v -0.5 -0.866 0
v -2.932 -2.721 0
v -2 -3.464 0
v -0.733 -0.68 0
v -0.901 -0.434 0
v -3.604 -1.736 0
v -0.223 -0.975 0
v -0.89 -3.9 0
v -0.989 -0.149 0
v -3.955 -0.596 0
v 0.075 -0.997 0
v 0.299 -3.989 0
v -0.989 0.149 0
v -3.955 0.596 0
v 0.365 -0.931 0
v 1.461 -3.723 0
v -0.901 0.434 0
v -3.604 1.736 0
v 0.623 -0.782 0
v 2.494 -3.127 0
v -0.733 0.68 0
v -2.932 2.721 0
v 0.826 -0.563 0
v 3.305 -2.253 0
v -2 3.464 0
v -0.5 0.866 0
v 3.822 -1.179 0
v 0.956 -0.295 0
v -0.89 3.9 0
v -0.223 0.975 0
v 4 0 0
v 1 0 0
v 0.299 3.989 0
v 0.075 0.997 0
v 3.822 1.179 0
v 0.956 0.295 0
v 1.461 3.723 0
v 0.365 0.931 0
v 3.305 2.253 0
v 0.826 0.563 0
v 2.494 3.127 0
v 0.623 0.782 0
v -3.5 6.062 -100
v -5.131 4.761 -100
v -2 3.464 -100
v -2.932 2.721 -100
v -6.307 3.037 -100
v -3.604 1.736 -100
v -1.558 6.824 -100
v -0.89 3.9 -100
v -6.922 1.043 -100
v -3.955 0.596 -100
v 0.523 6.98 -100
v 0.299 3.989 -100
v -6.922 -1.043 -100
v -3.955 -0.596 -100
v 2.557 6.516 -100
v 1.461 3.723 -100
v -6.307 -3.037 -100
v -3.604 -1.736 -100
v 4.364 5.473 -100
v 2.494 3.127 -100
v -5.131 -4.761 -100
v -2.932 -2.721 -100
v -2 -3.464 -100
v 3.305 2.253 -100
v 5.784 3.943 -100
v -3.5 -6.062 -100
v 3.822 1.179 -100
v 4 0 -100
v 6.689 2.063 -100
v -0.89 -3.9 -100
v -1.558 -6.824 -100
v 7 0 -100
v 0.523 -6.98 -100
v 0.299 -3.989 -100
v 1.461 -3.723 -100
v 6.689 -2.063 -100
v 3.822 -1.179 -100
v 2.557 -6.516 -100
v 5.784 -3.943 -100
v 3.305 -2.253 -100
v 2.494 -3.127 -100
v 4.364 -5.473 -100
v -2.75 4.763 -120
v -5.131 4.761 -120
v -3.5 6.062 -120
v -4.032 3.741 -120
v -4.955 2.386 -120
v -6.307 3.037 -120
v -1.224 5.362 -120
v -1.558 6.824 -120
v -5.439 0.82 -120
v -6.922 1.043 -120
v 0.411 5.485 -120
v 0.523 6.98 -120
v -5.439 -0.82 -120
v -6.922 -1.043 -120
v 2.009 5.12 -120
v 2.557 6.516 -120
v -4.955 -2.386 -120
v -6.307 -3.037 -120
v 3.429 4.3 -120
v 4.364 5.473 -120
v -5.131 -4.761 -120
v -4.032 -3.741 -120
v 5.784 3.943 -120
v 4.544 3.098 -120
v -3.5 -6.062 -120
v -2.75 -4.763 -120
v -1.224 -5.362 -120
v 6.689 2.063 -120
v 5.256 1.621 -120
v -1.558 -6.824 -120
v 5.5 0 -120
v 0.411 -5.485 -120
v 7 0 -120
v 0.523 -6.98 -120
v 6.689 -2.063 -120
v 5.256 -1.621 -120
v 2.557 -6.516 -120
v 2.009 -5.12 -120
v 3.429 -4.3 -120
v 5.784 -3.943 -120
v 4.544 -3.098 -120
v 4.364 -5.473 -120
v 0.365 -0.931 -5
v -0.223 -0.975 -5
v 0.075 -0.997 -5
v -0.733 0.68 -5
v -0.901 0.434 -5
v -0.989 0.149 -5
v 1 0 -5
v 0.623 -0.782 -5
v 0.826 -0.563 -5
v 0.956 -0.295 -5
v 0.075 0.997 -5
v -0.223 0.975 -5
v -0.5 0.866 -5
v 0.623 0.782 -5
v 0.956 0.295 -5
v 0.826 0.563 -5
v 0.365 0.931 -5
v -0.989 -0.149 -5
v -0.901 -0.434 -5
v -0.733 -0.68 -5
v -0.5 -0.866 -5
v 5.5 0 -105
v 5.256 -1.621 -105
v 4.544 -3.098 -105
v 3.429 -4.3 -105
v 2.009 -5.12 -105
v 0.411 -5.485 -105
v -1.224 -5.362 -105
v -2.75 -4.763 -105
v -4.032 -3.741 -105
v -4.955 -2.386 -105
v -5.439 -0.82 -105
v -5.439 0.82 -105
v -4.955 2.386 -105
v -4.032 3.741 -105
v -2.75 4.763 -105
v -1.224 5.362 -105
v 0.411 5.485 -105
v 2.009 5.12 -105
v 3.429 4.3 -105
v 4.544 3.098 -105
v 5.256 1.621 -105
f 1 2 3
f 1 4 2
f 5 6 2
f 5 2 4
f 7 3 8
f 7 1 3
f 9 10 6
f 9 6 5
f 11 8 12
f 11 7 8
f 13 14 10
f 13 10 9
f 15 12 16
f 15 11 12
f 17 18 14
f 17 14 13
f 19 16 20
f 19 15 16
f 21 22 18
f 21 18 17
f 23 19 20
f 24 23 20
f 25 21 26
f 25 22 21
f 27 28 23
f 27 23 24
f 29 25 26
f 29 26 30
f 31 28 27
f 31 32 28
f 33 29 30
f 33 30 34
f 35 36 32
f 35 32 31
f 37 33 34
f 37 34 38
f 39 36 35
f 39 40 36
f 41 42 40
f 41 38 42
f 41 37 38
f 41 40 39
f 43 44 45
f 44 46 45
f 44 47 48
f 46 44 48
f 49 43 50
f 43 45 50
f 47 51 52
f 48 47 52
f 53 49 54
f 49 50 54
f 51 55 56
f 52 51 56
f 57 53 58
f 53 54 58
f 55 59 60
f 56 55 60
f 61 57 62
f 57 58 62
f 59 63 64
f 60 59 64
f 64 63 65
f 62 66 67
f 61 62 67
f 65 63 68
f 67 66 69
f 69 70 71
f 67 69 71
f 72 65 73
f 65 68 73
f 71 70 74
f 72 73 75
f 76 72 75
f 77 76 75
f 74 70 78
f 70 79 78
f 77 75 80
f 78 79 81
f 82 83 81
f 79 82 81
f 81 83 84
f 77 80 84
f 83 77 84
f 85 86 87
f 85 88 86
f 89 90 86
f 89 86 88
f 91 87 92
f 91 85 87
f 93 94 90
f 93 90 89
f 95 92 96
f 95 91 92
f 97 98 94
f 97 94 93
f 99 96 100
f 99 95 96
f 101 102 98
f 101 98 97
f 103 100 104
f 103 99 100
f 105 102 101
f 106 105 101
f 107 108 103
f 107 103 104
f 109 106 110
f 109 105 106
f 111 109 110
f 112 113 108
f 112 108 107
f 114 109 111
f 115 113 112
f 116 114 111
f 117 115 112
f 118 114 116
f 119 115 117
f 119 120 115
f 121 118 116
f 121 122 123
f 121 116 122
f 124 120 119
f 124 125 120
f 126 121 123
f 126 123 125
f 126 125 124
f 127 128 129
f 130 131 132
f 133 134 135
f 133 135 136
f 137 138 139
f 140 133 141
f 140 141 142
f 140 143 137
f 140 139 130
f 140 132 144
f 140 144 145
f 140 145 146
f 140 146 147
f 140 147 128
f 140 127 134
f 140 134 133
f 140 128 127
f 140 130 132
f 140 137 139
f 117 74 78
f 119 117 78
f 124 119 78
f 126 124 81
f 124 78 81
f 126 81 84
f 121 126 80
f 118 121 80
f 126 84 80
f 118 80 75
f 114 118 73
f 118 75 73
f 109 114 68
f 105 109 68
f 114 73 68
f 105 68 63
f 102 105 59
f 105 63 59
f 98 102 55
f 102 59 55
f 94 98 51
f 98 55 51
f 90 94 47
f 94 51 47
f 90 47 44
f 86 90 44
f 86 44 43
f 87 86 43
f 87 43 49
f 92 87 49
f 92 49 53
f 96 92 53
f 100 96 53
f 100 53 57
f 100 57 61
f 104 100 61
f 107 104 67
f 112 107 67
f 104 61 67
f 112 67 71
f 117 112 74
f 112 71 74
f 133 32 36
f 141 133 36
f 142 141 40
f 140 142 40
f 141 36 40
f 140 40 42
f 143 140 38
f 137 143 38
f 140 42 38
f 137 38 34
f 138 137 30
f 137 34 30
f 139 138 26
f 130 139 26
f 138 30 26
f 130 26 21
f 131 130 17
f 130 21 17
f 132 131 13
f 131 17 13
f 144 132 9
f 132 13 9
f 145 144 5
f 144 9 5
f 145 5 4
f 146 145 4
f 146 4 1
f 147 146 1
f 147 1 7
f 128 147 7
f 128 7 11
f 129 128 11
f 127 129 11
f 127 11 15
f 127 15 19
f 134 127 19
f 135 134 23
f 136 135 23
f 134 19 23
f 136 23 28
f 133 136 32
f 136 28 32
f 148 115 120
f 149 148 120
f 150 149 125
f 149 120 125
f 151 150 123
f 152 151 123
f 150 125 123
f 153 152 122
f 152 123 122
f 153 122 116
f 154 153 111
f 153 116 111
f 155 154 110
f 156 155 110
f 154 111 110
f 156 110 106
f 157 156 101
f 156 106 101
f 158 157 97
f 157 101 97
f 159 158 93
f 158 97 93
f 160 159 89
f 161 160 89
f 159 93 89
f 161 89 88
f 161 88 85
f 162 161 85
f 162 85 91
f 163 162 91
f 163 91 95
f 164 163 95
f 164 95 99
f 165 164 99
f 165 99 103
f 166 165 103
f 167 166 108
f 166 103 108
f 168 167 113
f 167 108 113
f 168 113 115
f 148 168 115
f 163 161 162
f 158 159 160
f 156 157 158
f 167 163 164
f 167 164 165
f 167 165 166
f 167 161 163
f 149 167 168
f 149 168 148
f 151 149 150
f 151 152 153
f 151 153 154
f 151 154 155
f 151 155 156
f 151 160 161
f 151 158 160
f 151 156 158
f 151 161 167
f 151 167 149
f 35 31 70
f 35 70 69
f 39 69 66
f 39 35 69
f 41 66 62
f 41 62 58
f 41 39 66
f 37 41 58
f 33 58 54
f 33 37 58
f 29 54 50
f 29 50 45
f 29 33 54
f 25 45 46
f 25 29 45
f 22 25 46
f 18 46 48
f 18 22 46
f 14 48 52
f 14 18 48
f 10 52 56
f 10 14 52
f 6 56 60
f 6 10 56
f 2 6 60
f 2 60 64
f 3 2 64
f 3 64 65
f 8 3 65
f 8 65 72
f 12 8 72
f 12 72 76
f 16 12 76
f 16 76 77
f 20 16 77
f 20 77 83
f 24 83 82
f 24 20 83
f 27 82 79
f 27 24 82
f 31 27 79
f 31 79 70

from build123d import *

# Parameters (mm, degrees)
SKETCH_R        = 4
PAD_DEPTH       = 100
SKETCH001_R     = 1
POCKET_DEPTH    = 5
SKETCH002_R     = 7
PAD001_DEPTH    = 20
SKETCH003_R     = 5.5
POCKET001_DEPTH = 15


with BuildPart() as part:
    # Sketch → Pad (new body)
    with BuildSketch(Plane.XY):
        Circle(SKETCH_R)
    extrude(amount=-PAD_DEPTH)

    # Sketch001 → Pocket (cut)
    with BuildSketch(Plane.XY):
        Circle(SKETCH001_R)
    extrude(amount=-POCKET_DEPTH, mode=Mode.SUBTRACT)

    # Sketch002 → Pad001 (new body)
    with BuildSketch(Plane(origin=(0, 0, -100), x_dir=(1, 0, 0), z_dir=(0, 0, -1))):
        Circle(SKETCH002_R)
    extrude(amount=PAD001_DEPTH)

    # Sketch003 → Pocket001 (cut)
    with BuildSketch(Plane(origin=(0, 0, -120), x_dir=(1, 0, 0), z_dir=(0, 0, -1))):
        Circle(SKETCH003_R)
    extrude(amount=-POCKET001_DEPTH, mode=Mode.SUBTRACT)


solid = part.part
